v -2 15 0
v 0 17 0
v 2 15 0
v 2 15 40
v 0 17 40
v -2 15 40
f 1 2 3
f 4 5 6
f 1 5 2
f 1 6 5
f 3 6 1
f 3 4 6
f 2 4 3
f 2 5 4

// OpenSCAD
module triangular_prism_rect(b, h, l, c = false) {
  linear_extrude(height = l, center = c, convexity = 10, twist = 0)
  polygon(points=[[0,0],[b,0],[0,h]], paths=[[0,1,2]]);
}

module triangular_prism(b, h, l, c = false) {
  linear_extrude(height = l, center = c, convexity = 10, twist = 0)
  polygon(points=[[-b/2,0],[b/2,0],[0,h]], paths=[[0,1,2]]);
}
translate([0,15,0]) triangular_prism(4,2,40);
